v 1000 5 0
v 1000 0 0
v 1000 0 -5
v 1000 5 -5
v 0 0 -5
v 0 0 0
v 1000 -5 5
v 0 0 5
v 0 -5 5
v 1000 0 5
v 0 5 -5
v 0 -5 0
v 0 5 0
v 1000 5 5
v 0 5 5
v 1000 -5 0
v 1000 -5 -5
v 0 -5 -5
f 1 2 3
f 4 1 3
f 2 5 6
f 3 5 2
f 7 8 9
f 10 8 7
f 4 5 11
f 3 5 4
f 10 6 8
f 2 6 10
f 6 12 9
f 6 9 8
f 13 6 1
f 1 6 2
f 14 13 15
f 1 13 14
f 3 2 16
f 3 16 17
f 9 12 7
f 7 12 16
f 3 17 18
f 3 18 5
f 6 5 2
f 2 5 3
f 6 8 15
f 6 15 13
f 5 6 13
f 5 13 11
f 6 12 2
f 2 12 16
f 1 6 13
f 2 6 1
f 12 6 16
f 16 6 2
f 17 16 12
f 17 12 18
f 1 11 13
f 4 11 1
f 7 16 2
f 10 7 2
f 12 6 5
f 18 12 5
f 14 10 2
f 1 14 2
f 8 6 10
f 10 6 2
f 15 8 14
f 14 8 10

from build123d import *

# Parameters (mm, degrees)
SKETCH_1_W                 = 10
SKETCH_1_H                 = 10
EXTRUDE_1_DEPTH            = 1000
SPLIT_START                = -5
SPLIT_BODIES_1_OUTLINE_W   = 1000
SPLIT_BODIES_1_OUTLINE_H   = 5
SPLIT_BODIES_1_DEPTH       = 10
SPLIT_BODIES_1_2_OUTLINE_W = 1000
SPLIT_BODIES_1_2_OUTLINE_H = 5
SPLIT_BODIES_1_2_DEPTH     = 5
SPLIT_BODIES_1_3_OUTLINE_W = 1000
SPLIT_BODIES_1_3_OUTLINE_H = 5
SPLIT_BODIES_1_3_DEPTH     = 5
SPLIT_BODIES_1_4_OUTLINE_W = 1000
SPLIT_BODIES_1_4_OUTLINE_H = 5
SPLIT_BODIES_1_4_DEPTH     = 5
SPLIT_BODIES_1_5_OUTLINE_W = 1000
SPLIT_BODIES_1_5_OUTLINE_H = 5
SPLIT_BODIES_1_5_DEPTH     = 5


# Read off the part's stored shape, not the designer's step: Разделить1
with BuildPart() as part:
    # Эскиз1 → Бобышка-Вытянуть1 (new body)
    with BuildSketch(Plane(origin=(0, 0, 0), x_dir=(0, 0, -1), z_dir=(1, 0, 0))):
        Rectangle(SKETCH_1_W, SKETCH_1_H)
    extrude(amount=EXTRUDE_1_DEPTH)

    # Split Bodies 1 outline → Split Bodies 1 (cut)
    with BuildSketch(Plane(origin=(0, 0, 0), x_dir=(1, 0, 0), z_dir=(0, 1, 0)).offset(SPLIT_START)):
        with Locations((500, -2.5)):
            Rectangle(SPLIT_BODIES_1_OUTLINE_W, SPLIT_BODIES_1_OUTLINE_H)
    extrude(amount=SPLIT_BODIES_1_DEPTH, mode=Mode.SUBTRACT)

    # Split Bodies 1 2 outline → Split Bodies 1 2 (cut)
    with BuildSketch(Plane(origin=(0, 0, 0), x_dir=(1, 0, 0), z_dir=(0, 1, 0))):
        with Locations((500, 2.5)):
            Rectangle(SPLIT_BODIES_1_2_OUTLINE_W, SPLIT_BODIES_1_2_OUTLINE_H)
    extrude(amount=SPLIT_BODIES_1_2_DEPTH, mode=Mode.SUBTRACT)


with BuildPart() as body_2:
    # Split Bodies 1 3 outline → Split Bodies 1 3 (new body)
    with BuildSketch(Plane(origin=(0, 0, 0), x_dir=(1, 0, 0), z_dir=(0, 1, 0))):
        with Locations((500, -2.5)):
            Rectangle(SPLIT_BODIES_1_3_OUTLINE_W, SPLIT_BODIES_1_3_OUTLINE_H)
    extrude(amount=SPLIT_BODIES_1_3_DEPTH)


with BuildPart() as body_3:
    # Split Bodies 1 4 outline → Split Bodies 1 4 (new body)
    with BuildSketch(Plane.XY):
        with Locations((500, -2.5)):
            Rectangle(SPLIT_BODIES_1_4_OUTLINE_W, SPLIT_BODIES_1_4_OUTLINE_H)
    extrude(amount=SPLIT_BODIES_1_4_DEPTH)


with BuildPart() as body_4:
    # Split Bodies 1 5 outline → Split Bodies 1 5 (new body)
    with BuildSketch(Plane(origin=(0, 0, 0), x_dir=(1, 0, 0), z_dir=(0, 1, 0))):
        with Locations((500, 2.5)):
            Rectangle(SPLIT_BODIES_1_5_OUTLINE_W, SPLIT_BODIES_1_5_OUTLINE_H)
    extrude(amount=SPLIT_BODIES_1_5_DEPTH)


solid = Compound([part.part, body_2.part, body_3.part, body_4.part])
